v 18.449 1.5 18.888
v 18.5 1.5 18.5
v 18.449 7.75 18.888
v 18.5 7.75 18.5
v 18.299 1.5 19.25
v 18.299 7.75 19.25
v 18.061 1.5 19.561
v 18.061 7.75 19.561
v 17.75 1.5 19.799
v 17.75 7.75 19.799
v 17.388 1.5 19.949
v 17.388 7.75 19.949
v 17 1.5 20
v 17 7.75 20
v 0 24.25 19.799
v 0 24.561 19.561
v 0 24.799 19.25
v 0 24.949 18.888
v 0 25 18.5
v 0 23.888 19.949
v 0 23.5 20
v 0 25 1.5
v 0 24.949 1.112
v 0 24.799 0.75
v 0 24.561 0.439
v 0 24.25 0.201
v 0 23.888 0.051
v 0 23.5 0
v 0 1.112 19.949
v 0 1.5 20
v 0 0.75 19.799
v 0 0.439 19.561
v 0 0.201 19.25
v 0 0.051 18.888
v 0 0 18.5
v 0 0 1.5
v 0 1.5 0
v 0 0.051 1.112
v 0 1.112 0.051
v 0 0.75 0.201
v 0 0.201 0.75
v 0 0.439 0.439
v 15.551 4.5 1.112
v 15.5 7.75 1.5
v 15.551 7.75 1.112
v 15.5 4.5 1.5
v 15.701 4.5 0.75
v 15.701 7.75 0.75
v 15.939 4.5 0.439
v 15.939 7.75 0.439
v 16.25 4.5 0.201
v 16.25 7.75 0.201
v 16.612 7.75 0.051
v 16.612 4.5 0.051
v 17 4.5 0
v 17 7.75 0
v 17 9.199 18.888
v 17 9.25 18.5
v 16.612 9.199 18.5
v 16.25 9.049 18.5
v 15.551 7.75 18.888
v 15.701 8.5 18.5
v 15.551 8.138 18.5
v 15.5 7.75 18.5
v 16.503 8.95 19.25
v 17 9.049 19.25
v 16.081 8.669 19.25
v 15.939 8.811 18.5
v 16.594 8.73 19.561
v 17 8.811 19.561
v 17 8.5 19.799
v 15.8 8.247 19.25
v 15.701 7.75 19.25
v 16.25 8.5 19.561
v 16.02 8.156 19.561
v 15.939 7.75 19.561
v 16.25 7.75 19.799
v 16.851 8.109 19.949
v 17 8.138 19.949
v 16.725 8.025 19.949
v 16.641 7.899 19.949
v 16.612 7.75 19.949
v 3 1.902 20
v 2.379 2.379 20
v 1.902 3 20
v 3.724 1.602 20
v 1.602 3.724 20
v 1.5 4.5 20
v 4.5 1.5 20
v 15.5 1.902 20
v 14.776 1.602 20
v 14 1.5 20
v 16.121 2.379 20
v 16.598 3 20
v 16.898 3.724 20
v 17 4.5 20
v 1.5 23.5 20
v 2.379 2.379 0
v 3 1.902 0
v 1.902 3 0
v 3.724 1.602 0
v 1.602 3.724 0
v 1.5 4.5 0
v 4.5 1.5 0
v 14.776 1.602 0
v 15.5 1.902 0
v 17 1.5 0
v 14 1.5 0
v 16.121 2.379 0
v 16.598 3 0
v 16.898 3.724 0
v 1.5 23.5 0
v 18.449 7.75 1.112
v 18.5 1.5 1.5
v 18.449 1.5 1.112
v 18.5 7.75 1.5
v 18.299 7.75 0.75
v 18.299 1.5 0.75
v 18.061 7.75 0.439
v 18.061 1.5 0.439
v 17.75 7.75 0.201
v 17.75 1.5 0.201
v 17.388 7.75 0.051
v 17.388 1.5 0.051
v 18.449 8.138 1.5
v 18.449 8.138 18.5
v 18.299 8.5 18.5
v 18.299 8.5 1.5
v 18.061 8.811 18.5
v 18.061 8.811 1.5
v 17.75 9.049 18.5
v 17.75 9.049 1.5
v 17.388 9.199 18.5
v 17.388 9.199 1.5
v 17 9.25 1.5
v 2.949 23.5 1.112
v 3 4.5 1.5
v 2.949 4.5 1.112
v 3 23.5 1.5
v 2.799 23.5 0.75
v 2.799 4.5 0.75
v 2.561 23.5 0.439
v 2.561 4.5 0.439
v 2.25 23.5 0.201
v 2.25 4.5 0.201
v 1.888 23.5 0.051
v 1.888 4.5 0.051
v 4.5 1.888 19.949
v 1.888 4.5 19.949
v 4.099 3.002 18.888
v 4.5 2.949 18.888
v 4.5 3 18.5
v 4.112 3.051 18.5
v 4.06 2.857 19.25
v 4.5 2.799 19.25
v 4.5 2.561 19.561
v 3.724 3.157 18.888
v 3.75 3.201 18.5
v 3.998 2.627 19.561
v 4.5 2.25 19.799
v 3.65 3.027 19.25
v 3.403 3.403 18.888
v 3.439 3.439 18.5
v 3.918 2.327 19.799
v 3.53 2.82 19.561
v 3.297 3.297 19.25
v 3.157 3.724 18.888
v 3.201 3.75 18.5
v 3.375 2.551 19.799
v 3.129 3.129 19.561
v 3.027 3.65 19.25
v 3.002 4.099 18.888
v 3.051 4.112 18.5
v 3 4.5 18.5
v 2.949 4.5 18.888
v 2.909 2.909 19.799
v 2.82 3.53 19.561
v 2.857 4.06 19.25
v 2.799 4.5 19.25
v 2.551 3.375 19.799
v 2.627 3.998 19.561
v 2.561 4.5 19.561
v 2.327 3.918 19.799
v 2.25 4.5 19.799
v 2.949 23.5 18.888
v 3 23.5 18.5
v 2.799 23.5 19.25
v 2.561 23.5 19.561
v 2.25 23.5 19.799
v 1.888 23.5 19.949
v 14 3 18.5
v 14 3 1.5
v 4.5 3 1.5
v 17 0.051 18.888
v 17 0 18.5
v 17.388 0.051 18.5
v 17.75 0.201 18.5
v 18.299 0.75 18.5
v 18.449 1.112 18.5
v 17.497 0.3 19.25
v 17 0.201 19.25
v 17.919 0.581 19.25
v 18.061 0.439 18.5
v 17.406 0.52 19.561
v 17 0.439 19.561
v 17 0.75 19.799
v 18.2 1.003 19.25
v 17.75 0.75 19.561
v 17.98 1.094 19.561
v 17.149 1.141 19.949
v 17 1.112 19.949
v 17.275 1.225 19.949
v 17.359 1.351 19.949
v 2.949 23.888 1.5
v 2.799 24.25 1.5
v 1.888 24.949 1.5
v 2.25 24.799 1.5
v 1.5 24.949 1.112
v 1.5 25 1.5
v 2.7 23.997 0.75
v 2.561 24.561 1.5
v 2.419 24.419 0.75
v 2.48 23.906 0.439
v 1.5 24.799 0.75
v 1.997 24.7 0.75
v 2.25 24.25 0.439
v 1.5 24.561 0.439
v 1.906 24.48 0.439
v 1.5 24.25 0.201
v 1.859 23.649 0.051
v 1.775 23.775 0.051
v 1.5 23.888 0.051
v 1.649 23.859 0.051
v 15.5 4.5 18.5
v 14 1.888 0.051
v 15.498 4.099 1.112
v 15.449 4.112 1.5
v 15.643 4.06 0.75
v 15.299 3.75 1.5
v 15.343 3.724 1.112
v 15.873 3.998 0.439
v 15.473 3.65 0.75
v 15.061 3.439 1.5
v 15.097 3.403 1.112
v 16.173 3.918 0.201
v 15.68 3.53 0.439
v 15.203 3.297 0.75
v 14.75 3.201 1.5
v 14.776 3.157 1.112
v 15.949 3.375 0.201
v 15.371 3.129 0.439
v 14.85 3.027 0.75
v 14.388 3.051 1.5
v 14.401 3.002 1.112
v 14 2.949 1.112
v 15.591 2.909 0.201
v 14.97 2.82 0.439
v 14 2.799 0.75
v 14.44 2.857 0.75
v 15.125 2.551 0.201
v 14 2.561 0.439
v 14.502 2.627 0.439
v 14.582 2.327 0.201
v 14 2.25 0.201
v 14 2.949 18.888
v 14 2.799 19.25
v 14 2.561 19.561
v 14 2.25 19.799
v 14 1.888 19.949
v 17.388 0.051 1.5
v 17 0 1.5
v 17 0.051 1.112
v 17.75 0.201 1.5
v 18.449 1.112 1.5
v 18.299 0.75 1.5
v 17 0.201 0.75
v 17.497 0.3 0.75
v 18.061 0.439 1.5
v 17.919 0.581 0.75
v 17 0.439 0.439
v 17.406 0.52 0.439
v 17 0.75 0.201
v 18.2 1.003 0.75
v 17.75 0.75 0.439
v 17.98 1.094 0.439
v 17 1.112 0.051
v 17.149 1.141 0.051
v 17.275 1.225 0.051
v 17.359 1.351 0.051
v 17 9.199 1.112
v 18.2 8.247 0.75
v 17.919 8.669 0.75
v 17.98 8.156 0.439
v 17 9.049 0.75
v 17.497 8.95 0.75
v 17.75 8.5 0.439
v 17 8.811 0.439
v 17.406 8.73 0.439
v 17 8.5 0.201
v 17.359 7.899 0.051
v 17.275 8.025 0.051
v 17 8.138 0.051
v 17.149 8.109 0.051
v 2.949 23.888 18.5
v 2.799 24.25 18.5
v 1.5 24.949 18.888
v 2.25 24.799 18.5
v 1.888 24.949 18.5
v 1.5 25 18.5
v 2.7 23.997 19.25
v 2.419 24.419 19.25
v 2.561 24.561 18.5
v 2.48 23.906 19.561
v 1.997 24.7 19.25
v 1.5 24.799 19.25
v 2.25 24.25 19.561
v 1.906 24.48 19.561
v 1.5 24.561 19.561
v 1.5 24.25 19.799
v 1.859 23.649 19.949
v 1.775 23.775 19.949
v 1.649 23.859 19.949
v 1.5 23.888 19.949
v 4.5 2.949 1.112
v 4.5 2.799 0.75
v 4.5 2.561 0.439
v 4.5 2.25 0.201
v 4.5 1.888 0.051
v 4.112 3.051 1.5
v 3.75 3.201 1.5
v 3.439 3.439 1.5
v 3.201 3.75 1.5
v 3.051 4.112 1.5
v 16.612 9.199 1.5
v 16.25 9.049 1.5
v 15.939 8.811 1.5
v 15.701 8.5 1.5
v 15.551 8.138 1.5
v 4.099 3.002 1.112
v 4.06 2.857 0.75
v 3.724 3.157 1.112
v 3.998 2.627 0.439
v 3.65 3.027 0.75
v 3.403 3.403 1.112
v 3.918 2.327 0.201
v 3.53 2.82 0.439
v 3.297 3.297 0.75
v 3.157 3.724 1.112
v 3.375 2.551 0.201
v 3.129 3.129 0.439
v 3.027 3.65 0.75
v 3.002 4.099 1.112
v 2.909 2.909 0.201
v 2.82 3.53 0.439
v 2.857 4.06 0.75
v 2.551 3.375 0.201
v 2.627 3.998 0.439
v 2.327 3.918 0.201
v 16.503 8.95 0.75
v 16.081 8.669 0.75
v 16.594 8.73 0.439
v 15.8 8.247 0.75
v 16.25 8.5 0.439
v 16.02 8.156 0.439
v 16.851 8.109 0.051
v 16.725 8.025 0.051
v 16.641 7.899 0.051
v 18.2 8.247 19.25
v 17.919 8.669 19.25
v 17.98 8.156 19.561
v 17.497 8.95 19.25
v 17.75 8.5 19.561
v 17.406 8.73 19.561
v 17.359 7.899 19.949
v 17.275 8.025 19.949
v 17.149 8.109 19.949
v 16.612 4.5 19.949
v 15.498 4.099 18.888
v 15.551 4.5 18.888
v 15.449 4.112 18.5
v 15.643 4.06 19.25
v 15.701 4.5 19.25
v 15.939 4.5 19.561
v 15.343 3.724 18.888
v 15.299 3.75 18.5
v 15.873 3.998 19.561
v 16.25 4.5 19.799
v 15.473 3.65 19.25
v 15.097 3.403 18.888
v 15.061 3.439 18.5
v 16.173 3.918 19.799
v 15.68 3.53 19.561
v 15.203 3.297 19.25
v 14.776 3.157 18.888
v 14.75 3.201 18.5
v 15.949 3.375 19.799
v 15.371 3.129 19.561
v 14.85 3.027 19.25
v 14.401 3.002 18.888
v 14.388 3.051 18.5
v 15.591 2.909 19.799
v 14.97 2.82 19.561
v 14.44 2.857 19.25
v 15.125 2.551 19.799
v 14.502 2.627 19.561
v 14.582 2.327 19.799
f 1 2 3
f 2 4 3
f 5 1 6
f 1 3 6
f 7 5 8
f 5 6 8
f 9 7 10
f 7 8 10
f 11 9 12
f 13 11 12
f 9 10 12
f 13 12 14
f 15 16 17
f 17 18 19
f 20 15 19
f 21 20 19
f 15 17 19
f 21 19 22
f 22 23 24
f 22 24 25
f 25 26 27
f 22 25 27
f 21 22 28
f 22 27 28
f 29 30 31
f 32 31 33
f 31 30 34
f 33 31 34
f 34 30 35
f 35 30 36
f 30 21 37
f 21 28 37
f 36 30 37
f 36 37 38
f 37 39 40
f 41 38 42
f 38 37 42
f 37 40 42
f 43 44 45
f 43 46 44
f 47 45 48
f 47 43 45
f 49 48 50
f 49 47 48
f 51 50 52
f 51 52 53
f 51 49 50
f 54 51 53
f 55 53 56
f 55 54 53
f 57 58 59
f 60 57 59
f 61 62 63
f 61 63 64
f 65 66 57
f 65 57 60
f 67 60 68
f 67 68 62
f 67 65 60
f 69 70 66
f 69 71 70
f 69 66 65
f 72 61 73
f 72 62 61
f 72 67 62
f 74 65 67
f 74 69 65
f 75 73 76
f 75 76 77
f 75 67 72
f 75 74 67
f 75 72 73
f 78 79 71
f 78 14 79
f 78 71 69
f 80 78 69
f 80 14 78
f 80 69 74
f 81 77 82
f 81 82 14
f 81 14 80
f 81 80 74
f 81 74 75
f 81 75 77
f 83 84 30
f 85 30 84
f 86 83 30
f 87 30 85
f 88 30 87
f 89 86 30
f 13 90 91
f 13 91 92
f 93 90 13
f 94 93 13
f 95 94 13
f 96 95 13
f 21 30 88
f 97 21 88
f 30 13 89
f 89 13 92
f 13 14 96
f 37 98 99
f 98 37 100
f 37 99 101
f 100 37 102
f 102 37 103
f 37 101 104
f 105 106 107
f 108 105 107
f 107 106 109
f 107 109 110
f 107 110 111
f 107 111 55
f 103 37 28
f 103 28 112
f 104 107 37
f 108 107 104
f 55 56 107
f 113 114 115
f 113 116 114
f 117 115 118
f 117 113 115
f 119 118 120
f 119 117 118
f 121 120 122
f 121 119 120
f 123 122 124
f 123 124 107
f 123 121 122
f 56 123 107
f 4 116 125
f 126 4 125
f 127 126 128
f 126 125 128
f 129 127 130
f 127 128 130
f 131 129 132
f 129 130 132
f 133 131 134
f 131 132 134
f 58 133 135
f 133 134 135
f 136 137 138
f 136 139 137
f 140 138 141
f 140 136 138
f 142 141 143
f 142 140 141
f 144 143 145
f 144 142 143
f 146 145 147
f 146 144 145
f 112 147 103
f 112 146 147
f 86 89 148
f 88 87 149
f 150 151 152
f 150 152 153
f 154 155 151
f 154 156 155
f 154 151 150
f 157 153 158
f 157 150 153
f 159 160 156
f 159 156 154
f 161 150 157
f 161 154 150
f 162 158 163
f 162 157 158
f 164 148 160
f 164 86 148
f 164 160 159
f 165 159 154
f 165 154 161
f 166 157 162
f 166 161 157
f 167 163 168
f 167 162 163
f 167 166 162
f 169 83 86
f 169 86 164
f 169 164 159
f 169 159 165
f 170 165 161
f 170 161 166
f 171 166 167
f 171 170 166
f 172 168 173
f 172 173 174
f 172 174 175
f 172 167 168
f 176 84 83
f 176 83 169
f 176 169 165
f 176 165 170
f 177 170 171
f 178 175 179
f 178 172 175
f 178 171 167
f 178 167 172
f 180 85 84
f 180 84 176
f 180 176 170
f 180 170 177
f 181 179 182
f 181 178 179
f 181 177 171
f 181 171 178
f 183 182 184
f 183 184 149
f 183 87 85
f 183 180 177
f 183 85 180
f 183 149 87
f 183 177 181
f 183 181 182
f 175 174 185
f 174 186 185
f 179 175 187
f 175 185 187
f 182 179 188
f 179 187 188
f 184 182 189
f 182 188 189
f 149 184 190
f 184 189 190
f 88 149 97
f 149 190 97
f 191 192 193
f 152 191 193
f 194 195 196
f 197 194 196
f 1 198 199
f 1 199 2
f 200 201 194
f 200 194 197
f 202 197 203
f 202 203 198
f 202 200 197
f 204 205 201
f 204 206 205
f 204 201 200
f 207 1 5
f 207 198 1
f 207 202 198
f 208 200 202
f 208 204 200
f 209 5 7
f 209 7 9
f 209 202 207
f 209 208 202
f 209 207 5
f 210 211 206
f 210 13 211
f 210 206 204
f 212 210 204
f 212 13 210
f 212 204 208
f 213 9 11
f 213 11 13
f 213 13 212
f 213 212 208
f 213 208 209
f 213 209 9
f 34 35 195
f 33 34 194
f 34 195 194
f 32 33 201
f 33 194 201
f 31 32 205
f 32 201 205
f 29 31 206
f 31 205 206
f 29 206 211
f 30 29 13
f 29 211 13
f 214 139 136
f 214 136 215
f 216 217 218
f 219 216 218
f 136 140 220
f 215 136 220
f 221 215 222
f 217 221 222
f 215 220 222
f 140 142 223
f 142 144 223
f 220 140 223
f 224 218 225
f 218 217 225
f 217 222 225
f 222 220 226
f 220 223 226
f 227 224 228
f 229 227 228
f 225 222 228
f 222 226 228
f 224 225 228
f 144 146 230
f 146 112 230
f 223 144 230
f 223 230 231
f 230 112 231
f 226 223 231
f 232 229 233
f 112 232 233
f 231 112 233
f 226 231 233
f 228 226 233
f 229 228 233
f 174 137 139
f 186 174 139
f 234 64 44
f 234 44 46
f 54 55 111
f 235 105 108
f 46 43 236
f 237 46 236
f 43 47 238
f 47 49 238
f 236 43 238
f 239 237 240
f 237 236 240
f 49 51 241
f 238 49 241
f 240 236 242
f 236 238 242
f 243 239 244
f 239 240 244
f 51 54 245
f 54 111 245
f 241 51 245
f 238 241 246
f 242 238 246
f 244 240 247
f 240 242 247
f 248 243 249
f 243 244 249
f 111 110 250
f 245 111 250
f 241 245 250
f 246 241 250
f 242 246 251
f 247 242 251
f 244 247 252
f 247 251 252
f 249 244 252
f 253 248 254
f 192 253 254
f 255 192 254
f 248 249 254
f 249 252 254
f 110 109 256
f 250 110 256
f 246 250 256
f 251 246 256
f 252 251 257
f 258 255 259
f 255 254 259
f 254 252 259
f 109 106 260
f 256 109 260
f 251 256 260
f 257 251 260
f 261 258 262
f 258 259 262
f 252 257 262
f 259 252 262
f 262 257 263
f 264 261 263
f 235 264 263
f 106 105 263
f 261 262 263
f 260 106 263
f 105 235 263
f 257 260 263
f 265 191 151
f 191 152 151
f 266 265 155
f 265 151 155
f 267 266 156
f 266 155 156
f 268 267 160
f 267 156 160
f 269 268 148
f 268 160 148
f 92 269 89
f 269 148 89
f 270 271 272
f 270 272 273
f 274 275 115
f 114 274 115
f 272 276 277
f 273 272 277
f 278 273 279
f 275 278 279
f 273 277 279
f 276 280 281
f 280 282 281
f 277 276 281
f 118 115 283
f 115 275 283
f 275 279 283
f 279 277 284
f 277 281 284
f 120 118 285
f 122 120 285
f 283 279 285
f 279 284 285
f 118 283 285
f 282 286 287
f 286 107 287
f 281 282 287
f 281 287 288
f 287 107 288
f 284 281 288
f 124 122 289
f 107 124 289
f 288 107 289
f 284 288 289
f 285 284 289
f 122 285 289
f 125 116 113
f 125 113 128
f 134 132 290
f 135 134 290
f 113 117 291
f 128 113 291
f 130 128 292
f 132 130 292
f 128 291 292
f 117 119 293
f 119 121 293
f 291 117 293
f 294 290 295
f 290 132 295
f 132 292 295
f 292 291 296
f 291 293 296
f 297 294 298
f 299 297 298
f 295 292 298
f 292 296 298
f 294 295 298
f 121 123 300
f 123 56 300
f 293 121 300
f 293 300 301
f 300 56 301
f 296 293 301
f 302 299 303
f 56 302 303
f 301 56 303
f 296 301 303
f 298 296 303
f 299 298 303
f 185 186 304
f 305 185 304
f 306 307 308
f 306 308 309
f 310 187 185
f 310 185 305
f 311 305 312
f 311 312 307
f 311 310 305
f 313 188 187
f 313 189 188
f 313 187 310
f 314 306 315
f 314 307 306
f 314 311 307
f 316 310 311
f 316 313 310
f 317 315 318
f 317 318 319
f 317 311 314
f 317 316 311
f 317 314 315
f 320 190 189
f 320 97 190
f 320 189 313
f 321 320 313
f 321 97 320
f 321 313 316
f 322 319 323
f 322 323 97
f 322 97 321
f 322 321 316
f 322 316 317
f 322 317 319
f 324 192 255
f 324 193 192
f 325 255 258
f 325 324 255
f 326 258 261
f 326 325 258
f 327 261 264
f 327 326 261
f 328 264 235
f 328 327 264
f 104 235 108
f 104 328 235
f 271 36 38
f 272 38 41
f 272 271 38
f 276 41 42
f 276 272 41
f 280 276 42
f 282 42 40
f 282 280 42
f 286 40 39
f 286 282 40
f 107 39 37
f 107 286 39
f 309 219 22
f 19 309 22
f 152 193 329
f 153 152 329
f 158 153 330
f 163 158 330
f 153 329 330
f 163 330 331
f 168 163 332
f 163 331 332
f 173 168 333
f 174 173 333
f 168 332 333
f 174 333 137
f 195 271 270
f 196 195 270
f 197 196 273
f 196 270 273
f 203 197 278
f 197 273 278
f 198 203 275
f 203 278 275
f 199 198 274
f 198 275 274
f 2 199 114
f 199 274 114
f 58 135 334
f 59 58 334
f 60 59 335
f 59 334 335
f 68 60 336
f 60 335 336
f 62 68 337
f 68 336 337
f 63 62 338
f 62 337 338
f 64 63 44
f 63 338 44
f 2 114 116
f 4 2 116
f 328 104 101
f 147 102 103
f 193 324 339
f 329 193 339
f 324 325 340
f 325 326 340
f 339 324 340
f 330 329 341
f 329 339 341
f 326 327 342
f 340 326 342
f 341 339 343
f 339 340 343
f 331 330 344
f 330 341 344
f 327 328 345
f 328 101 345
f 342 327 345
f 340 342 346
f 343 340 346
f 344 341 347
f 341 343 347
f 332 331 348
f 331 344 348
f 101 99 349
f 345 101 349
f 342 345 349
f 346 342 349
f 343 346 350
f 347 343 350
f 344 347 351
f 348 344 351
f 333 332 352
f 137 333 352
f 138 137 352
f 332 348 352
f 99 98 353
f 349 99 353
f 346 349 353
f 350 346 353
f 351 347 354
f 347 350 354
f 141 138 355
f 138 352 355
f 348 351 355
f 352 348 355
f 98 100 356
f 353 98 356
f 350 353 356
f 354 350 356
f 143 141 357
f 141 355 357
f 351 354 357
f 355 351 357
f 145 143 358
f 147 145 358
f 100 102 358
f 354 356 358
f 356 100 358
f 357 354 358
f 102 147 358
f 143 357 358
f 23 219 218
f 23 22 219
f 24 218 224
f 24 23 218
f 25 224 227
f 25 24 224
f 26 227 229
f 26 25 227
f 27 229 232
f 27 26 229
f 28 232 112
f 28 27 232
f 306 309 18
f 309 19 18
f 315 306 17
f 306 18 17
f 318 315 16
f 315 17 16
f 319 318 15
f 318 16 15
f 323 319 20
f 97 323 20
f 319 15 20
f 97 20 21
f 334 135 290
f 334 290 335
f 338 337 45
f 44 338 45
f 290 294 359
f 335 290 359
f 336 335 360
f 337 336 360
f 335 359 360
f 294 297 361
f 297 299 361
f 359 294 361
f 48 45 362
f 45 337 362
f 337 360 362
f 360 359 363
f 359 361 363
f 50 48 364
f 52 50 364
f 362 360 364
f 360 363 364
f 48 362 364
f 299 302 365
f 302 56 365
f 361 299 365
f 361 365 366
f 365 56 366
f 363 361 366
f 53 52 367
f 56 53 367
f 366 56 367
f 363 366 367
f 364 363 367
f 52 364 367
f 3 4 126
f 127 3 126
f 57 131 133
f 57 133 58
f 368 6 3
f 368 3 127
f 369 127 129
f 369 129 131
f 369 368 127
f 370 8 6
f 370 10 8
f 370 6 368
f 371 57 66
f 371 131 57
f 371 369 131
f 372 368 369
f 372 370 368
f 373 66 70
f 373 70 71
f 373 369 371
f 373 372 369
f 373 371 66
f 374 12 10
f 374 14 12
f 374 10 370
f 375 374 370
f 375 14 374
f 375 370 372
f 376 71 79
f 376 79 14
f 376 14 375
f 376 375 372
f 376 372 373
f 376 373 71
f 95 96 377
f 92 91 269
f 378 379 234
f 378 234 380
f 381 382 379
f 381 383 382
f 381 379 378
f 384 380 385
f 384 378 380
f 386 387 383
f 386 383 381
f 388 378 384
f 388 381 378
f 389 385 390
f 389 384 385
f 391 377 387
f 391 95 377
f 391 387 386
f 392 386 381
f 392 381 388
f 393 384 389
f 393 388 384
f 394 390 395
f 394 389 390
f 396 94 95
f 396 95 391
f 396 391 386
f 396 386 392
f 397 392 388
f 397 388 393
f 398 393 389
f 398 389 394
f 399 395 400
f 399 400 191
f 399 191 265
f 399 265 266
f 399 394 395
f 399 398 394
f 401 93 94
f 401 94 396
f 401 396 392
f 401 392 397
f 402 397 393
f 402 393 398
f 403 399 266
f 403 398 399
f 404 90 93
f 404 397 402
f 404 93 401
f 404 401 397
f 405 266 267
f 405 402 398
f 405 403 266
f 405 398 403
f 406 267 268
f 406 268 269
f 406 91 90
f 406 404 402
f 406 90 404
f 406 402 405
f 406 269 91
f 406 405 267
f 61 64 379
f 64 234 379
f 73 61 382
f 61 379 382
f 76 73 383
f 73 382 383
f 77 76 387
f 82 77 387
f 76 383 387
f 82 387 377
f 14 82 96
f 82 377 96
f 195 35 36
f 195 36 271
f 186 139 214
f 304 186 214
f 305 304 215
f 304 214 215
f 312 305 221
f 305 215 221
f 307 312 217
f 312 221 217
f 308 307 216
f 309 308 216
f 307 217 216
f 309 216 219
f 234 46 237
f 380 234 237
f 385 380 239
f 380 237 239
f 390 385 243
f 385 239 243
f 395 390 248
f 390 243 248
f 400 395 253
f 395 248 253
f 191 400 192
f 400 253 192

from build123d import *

# Parameters (mm, degrees)
F1_DEPTH = 20
F2_R     = 1.49999


# Not quite as in the source:
# - a fillet or chamfer is up to 0.001 mm smaller than in the source, because OpenCascade refuses the exact size


with BuildPart() as f1:
    # F0 (on Top) → F1 (new body)
    with BuildSketch(Plane.XY):
        with BuildLine():
            Line((1.5, 25), (0, 25))
            Line((0, 25), (0, 0))
            Line((0, 0), (17, 0))
            ThreePointArc((17, 0), (18.0606601718, 0.4393398282), (18.5, 1.5))
            Line((18.5, 1.5), (18.5, 7.75))
            ThreePointArc((18.5, 7.75), (18.0606601718, 8.8106601718), (17, 9.25))
            ThreePointArc((17, 9.25), (15.9393398282, 8.8106601718), (15.5, 7.75))
            Line((15.5, 7.75), (15.5, 4.5))
            ThreePointArc((15.5, 4.5), (15.0606601718, 3.4393398282), (14, 3))
            Line((14, 3), (4.5, 3))
            ThreePointArc((4.5, 3), (3.4393398282, 3.4393398282), (3, 4.5))
            Line((3, 4.5), (3, 23.5))
            ThreePointArc((3, 23.5), (2.5606601718, 24.5606601718), (1.5, 25))
        make_face()
    extrude(amount=F1_DEPTH)

    # F2 (radius 1.5 in the source; OpenCascade refuses exactly that, so slightly less here)
    f2_edges = [f1.edges().sort_by_distance(p)[0] for p in [
        (3, 14, 20),
        (9.25, 3, 0),
    ]]
    fillet(f2_edges, radius=F2_R)


solid = f1.part
